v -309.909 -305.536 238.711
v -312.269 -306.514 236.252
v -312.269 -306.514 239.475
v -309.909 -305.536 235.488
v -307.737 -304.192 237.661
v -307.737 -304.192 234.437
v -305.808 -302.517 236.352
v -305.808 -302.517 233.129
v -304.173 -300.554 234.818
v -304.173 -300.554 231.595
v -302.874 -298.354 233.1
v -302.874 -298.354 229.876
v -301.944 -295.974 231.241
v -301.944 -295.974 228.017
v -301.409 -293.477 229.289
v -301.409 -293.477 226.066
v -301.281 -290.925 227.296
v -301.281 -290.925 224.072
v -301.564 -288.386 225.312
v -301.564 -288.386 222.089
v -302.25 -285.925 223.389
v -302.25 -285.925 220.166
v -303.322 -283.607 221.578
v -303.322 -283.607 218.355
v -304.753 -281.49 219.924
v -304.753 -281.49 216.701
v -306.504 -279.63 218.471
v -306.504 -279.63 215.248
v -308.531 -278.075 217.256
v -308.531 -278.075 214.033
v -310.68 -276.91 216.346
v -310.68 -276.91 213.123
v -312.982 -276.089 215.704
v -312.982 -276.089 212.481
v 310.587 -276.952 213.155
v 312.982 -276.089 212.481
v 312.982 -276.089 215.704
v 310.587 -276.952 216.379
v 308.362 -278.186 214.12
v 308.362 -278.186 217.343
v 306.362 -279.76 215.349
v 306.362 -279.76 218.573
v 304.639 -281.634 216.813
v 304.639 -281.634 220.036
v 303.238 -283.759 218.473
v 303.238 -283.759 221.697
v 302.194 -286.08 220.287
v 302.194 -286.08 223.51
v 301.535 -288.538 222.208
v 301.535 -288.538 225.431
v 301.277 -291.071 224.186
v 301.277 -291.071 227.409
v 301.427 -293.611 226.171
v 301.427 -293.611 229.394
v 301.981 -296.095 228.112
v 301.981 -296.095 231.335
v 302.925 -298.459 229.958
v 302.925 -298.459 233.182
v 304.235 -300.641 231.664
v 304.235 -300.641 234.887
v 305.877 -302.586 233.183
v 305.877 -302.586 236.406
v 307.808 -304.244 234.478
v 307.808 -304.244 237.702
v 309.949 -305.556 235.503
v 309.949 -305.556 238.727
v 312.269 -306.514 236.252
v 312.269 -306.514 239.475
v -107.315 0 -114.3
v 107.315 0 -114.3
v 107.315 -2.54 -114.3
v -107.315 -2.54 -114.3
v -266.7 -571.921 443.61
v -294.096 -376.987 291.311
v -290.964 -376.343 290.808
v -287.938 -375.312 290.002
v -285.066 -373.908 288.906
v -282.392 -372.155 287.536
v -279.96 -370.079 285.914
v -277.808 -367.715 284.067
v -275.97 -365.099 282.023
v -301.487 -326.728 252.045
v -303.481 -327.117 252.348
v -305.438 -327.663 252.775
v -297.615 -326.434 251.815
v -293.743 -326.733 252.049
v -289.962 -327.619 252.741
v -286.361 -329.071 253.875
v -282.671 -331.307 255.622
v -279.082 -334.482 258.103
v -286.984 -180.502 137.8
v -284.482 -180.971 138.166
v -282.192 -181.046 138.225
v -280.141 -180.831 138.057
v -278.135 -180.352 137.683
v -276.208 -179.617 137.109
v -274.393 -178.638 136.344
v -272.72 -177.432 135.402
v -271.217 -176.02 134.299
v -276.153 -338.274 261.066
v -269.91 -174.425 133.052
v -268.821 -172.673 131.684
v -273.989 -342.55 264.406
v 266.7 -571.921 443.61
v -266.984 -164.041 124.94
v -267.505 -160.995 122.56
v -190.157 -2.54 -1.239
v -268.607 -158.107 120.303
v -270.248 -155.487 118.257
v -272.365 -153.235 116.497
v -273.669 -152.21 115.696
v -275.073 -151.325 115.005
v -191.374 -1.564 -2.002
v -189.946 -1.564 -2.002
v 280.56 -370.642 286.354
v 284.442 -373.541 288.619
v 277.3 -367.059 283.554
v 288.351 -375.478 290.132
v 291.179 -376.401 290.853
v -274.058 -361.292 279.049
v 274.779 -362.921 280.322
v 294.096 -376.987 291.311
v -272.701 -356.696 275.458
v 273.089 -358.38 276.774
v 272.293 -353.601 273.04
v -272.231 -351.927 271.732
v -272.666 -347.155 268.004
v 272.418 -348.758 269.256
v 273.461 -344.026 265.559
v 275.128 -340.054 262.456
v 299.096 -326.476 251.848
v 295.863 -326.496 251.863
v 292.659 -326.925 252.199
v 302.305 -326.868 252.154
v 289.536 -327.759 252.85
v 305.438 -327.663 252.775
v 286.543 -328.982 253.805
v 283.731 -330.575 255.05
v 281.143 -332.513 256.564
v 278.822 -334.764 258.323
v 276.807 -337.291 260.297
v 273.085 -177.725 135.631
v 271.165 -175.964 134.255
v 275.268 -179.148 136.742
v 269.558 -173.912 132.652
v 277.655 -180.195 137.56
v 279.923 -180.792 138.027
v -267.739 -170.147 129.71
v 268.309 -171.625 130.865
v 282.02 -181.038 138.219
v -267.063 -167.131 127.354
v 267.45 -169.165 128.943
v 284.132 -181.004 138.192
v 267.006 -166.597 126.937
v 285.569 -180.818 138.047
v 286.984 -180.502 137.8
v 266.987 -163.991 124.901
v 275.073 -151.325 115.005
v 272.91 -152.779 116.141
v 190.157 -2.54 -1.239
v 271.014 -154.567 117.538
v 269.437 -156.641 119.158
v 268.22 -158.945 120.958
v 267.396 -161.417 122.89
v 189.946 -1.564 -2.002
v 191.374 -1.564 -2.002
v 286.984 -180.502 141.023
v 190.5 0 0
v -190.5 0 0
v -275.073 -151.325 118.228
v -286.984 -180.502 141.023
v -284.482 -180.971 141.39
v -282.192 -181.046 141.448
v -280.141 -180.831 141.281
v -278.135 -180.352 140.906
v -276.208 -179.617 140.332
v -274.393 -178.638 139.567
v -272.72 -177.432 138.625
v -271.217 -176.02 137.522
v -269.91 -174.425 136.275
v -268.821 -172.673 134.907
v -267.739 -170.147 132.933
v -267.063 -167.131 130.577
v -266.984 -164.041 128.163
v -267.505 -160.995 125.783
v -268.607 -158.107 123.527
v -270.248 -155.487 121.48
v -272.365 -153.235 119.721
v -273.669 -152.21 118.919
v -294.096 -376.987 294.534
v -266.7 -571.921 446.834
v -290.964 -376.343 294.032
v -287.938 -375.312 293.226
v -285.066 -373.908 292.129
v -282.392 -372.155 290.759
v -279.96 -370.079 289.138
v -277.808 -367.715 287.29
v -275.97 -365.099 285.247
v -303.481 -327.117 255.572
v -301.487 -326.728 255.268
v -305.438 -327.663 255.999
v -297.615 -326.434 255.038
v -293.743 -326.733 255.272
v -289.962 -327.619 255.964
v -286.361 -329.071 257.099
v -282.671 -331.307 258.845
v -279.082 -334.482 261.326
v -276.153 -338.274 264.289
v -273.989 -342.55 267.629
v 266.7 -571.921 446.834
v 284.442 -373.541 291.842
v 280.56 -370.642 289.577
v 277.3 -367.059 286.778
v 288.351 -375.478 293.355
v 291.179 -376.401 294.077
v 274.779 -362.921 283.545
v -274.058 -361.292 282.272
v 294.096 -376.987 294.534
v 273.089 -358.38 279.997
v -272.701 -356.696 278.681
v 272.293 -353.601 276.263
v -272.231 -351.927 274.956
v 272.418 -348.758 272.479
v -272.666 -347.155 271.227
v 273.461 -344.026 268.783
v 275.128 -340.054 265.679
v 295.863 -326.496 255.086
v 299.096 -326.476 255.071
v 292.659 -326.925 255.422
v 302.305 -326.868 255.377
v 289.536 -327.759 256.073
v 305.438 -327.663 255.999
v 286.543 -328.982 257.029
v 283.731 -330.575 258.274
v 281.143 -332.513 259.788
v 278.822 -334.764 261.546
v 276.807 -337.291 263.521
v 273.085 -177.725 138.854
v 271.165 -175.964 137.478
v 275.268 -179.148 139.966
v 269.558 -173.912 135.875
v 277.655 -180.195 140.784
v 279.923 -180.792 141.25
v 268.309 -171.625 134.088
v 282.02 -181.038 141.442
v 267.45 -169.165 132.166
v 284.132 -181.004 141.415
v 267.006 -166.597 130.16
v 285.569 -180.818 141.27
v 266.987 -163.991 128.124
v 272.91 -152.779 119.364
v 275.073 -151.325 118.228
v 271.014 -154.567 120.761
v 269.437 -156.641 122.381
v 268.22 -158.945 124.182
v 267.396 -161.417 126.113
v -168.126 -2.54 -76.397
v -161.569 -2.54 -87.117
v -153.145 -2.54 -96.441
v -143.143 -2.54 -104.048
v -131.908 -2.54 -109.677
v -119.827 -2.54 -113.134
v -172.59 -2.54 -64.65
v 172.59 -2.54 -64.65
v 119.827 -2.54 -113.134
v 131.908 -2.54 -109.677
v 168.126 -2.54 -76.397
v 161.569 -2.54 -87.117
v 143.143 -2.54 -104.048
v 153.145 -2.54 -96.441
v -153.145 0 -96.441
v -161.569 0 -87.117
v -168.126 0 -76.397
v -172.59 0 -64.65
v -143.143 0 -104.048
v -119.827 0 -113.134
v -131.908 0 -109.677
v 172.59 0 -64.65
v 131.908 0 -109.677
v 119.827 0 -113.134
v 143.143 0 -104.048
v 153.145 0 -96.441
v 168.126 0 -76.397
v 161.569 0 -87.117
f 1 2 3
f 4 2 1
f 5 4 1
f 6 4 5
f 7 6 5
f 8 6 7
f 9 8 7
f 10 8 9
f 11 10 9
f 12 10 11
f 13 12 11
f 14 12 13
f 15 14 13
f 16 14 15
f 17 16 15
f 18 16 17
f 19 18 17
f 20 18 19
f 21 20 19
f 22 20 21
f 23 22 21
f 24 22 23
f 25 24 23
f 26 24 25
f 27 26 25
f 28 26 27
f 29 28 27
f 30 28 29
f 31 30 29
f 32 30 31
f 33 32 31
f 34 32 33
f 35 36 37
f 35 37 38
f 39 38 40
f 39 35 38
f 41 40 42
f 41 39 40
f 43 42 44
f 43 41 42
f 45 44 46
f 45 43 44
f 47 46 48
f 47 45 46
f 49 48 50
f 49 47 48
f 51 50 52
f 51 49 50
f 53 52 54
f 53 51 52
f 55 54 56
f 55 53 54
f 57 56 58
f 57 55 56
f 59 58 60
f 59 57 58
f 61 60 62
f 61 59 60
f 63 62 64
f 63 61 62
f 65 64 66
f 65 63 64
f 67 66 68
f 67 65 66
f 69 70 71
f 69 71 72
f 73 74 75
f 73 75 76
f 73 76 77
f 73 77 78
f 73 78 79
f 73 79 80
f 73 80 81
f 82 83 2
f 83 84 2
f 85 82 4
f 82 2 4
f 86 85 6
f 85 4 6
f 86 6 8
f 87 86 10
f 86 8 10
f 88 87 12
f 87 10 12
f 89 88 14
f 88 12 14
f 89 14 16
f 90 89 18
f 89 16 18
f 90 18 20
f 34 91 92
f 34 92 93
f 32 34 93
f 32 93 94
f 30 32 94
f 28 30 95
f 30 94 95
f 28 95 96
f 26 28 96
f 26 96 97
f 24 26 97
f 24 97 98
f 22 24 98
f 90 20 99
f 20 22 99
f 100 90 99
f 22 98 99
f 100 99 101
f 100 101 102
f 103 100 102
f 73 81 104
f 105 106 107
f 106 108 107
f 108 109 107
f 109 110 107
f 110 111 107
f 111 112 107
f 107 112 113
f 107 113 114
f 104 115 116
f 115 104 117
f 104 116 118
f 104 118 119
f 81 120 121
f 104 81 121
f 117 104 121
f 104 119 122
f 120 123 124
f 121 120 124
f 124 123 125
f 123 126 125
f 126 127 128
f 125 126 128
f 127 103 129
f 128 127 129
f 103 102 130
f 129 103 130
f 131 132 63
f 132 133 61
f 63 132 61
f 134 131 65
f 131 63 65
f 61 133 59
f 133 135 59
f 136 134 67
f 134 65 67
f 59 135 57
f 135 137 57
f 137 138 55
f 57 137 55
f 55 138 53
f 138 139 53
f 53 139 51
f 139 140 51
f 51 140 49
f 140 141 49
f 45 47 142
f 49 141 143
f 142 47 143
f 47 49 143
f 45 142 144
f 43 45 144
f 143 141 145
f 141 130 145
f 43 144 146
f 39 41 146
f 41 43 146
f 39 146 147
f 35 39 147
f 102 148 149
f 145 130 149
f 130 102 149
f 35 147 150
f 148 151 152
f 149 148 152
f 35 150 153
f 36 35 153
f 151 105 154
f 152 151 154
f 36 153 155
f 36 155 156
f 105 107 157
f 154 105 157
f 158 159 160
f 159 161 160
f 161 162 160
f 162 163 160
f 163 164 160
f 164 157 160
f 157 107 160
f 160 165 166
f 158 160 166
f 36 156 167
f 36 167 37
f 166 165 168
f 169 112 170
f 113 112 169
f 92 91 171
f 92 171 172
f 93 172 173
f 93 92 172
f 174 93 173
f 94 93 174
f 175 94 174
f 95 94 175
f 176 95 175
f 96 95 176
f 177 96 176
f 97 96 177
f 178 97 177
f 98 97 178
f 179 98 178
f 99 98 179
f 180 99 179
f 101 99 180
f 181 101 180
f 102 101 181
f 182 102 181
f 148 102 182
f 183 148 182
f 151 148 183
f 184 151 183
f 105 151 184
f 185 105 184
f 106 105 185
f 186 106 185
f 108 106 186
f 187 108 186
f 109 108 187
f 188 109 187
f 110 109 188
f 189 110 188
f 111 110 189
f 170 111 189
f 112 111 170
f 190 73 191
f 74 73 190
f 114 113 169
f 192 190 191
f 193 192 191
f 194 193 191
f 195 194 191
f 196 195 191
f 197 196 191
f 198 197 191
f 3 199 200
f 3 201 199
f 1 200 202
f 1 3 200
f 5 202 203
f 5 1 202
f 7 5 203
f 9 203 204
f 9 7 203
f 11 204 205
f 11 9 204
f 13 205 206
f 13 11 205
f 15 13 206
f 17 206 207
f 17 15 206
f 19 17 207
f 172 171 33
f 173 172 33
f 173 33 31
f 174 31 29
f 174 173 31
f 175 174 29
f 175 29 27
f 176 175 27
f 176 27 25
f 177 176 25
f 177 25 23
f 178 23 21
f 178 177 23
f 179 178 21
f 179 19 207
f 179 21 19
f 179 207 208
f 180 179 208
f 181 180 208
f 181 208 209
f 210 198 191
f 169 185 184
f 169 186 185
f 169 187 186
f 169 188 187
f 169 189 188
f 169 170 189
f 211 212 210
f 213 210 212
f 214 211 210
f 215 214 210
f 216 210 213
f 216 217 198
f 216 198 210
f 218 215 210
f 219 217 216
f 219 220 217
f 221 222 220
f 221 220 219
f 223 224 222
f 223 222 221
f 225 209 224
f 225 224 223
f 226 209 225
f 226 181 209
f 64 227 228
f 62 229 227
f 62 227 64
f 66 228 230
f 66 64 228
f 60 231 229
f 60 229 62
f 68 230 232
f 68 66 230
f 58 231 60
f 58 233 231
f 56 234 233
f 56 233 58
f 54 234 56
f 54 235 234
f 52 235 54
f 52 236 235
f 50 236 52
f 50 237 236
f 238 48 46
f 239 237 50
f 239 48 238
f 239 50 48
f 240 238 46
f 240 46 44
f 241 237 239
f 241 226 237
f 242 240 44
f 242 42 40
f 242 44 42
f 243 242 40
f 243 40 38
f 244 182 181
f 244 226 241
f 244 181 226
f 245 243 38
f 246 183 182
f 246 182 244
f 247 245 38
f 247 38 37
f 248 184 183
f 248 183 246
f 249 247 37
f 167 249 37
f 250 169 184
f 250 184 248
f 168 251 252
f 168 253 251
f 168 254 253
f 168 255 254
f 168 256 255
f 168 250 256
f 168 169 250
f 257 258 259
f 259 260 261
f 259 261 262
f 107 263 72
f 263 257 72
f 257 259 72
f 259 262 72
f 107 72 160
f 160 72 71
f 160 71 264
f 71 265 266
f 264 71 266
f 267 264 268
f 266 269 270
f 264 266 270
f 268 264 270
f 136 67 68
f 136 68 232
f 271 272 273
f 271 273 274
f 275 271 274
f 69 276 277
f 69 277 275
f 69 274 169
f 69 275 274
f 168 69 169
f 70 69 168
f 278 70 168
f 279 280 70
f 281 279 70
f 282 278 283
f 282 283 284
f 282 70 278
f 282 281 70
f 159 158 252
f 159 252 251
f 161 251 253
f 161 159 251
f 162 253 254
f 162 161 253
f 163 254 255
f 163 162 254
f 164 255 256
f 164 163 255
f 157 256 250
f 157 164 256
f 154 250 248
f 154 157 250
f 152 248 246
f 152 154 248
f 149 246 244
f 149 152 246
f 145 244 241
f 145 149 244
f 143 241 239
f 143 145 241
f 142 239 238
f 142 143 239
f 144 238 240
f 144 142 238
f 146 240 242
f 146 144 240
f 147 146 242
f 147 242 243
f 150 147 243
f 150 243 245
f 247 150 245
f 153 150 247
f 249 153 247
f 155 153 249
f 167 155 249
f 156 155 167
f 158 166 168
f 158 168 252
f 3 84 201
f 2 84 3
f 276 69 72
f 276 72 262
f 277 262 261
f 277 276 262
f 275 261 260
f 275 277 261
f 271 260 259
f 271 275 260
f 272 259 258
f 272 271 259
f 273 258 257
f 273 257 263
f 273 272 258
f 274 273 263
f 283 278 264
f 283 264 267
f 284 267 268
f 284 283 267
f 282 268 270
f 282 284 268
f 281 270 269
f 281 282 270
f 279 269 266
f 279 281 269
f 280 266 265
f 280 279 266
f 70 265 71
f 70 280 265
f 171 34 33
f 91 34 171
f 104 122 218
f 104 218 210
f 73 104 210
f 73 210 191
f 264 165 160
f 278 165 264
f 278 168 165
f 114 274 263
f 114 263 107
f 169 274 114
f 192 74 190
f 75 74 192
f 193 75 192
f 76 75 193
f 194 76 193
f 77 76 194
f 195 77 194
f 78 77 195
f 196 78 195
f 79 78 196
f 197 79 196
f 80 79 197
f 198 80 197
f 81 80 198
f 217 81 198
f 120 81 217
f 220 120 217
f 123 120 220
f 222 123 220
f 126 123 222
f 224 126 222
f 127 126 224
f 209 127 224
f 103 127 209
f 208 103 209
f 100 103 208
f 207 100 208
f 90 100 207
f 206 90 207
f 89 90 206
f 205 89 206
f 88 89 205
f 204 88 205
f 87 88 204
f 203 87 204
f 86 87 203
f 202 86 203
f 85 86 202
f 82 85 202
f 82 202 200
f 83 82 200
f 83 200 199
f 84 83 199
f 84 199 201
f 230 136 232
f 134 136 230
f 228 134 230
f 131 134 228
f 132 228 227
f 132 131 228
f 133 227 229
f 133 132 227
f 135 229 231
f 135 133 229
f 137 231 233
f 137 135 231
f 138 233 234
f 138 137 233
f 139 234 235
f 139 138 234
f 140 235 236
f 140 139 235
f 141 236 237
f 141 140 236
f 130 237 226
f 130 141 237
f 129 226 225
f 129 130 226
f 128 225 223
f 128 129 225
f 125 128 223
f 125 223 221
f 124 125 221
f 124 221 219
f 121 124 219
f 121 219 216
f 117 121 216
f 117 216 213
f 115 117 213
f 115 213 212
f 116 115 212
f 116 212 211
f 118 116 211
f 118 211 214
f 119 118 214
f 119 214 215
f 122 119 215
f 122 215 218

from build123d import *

# Parameters (mm, degrees)
BOSS_EXTRUDE1_DEPTH     = 2.54
SKETCH3_W               = 635
SKETCH3_H               = 1270
BOSS_EXTRUDE2_DEPTH     = 2.54
CUT_EXTRUDE1_DEPTH      = 1311.281906829
CUT_EXTRUDE1_DEPTH_BACK = 1311.281906829


with BuildPart() as part:
    # Sketch2 → Boss-Extrude1 (new body)
    with BuildSketch(Plane(origin=(0, 0, 0), x_dir=(1, 0, 0), z_dir=(0, 1, 0))):
        with BuildLine():
            Line((-190.5, 0), (190.5, 0))
            Line((190.5, 0), (172.589792707, 64.649970609))
            ThreePointArc((172.589792707, 64.649970609), (148.320865378, 100.476994518), (107.315, 114.3))
            Line((107.315, 114.3), (-107.315, 114.3))
            ThreePointArc((-107.315, 114.3), (-148.320865378, 100.476994518), (-172.589792707, 64.649970609))
            Line((-172.589792707, 64.649970609), (-190.5, 0))
        make_face()
    extrude(amount=-BOSS_EXTRUDE1_DEPTH)

    # Sketch3 → Boss-Extrude2 (add)
    with BuildSketch(Plane(origin=(0, 0, 0), x_dir=(1, 0, 0), z_dir=(0, 0.6156614753256567, 0.7880107536067232))):
        with Locations((0, -635)):
            Rectangle(SKETCH3_W, SKETCH3_H)
    extrude(amount=-BOSS_EXTRUDE2_DEPTH)

    # Sketch4 → Cut-Extrude1 (cut, two sides: drawn at the far end of the back side and taken through both)
    with BuildSketch(Plane.XY.offset(-CUT_EXTRUDE1_DEPTH_BACK)):
        with BuildLine():
            Line((-275.07291121, -151.325406705), (-190.5, 0))
            Line((-190.5, 0), (-571.5, 0))
            Line((-571.5, 0), (-571.5, -1524))
            Line((-571.5, -1524), (571.5, -1524))
            Line((571.5, -1524), (571.5, 0))
            Line((571.5, 0), (190.5, 0))
            Line((190.5, 0), (275.07291121, -151.325406705))
            ThreePointArc((275.07291121, -151.325406705), (268.12028899, -171.183230141), (286.984028398, -180.501569203))
            Line((286.984028398, -180.501569203), (312.982021819, -276.089162217))
            ThreePointArc((312.982021819, -276.089162217), (301.277723529, -291.035795076), (312.269080611, -306.514247899))
            Line((312.269080611, -306.514247899), (305.43807978, -327.663433526))
            ThreePointArc((305.43807978, -327.663433526), (272.877245274, -346.141774353), (294.096224924, -376.98674033))
            Line((294.096224924, -376.98674033), (266.7, -571.921009662))
            Line((266.7, -571.921009662), (-266.7, -571.921009662))
            Line((-266.7, -571.921009662), (-294.096224924, -376.98674033))
            ThreePointArc((-294.096224924, -376.98674033), (-272.877245274, -346.141774353), (-305.43807978, -327.663433526))
            Line((-305.43807978, -327.663433526), (-312.269080611, -306.514247899))
            ThreePointArc((-312.269080611, -306.514247899), (-301.277723529, -291.035795076), (-312.982021819, -276.089162217))
            Line((-312.982021819, -276.089162217), (-286.984028398, -180.501569203))
            ThreePointArc((-286.984028398, -180.501569203), (-268.12028899, -171.183230141), (-275.07291121, -151.325406705))
        make_face()
    extrude(amount=CUT_EXTRUDE1_DEPTH + CUT_EXTRUDE1_DEPTH_BACK, mode=Mode.SUBTRACT)


solid = part.part
